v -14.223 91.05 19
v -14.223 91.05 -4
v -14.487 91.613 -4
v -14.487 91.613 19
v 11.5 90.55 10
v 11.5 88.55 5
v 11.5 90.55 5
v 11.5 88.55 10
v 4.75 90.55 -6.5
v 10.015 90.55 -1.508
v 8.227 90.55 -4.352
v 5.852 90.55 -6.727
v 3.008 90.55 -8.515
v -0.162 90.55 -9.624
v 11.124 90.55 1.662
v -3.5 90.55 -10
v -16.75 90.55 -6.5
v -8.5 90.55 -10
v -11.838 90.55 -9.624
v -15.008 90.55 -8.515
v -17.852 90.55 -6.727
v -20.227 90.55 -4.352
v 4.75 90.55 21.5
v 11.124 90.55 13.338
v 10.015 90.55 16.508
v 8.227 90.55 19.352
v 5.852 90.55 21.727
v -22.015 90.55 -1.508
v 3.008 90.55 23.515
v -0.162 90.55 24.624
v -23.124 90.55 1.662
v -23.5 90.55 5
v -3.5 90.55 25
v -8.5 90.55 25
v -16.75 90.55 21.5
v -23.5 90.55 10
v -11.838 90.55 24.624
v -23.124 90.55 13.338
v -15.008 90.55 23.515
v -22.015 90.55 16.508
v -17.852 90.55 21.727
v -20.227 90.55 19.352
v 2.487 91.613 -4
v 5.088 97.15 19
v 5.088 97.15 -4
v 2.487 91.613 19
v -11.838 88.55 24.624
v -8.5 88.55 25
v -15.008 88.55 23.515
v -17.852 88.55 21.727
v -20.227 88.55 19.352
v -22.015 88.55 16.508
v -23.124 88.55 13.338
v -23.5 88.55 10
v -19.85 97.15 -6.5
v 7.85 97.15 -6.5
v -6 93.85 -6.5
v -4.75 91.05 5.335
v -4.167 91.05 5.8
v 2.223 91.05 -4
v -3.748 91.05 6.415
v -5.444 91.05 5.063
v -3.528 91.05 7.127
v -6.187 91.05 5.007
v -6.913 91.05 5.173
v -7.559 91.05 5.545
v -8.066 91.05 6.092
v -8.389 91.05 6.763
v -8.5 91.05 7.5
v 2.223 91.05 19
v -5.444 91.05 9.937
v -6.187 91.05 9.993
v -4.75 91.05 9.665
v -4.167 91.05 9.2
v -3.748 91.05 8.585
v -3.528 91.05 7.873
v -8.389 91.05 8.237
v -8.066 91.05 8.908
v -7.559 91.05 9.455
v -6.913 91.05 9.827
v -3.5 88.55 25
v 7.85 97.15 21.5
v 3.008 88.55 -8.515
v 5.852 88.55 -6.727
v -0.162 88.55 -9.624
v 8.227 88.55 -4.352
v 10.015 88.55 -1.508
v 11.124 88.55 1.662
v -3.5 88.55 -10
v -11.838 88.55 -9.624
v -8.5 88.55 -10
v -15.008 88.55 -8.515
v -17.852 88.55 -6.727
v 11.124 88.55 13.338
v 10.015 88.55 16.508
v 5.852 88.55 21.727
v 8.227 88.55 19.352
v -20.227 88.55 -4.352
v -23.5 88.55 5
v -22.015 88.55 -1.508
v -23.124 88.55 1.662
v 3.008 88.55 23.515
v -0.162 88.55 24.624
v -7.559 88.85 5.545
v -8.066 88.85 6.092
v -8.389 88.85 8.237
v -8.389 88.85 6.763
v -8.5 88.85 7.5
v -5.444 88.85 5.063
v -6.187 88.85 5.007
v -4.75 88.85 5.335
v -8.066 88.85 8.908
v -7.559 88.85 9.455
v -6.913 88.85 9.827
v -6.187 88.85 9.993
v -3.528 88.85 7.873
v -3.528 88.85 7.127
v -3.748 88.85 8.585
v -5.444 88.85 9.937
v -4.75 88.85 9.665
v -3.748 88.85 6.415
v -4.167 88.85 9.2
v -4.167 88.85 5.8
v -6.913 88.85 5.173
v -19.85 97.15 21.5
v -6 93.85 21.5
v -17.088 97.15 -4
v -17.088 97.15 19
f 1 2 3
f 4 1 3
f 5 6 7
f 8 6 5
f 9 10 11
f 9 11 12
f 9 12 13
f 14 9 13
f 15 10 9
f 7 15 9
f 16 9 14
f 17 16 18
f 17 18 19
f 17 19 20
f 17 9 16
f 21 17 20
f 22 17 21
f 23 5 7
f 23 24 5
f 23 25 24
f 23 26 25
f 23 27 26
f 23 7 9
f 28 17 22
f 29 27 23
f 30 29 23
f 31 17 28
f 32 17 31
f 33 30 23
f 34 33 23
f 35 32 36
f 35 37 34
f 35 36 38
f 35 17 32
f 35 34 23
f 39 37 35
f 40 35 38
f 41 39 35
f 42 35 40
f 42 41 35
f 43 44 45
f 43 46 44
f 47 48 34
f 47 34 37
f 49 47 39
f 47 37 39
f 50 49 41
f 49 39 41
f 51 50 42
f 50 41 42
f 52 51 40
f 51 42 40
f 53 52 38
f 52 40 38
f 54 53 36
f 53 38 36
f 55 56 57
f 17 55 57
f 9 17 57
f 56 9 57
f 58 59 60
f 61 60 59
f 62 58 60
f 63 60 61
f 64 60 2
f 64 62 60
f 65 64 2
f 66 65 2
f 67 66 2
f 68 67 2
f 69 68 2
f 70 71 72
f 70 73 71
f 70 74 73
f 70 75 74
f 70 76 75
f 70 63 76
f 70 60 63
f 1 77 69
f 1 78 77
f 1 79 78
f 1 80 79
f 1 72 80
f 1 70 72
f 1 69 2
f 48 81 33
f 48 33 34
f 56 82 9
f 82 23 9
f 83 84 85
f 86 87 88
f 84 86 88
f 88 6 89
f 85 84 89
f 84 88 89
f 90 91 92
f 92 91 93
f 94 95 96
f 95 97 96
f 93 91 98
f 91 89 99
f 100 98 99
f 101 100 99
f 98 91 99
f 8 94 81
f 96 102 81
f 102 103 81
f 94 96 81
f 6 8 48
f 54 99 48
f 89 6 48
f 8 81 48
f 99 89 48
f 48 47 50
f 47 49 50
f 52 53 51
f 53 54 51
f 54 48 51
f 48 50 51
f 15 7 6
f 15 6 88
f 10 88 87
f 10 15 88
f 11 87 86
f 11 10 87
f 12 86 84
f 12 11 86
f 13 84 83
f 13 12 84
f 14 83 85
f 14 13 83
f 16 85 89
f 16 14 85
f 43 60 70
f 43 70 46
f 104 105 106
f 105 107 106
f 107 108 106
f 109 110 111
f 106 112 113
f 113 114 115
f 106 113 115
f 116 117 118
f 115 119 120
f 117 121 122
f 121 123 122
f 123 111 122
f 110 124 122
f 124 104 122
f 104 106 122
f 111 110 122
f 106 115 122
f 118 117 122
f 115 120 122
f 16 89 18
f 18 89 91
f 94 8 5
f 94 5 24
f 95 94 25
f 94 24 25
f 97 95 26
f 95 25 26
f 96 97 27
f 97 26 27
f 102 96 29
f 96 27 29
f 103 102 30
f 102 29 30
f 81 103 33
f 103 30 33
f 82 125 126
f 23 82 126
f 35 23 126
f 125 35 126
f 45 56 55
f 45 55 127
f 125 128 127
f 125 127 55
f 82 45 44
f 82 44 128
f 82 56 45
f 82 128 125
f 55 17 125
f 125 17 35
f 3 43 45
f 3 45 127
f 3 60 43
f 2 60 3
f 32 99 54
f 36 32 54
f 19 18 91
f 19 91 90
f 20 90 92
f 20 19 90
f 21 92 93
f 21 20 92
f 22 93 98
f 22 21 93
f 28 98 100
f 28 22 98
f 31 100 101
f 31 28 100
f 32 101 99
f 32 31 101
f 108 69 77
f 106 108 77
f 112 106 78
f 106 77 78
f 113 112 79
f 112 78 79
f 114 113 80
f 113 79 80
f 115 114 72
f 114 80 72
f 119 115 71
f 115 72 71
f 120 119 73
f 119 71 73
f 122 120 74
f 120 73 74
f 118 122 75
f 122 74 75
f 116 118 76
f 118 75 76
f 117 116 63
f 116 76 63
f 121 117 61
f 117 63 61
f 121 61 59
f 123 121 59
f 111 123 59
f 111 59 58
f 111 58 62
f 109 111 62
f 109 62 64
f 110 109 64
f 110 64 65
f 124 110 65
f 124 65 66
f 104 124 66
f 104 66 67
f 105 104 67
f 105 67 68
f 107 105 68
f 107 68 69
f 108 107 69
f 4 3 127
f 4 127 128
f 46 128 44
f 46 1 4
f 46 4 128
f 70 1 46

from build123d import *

# Parameters (mm, degrees)
F1_DEPTH     = 6
F3_DEPTH     = 15
F5_DEPTH     = 5.0000008951
F6_R         = 5
F10_DEPTH    = 5
F11_W        = 35
F11_H        = 35
F12_DEPTH    = 2
F15_W        = 27.7
F15_H        = 28
F13_W        = 21.5
F13_H        = 28
F17_T        = 2.5
F17_T3_DEPTH = 26.5
F17_T5_DEPTH = 33
F19_R        = 2.5
F20_DEPTH    = 54.5
F21_R        = 15
F22_R        = 3
F23_R        = 0.5
F24_R        = 2
F25_R        = 6
F28_DEPTH    = 0.3


# Not quite as in the source:
# - ends of sketch curves that miss each other by under 0.0002 mm in the source are joined
# - a shell that OpenCascade refuses in one call is made with other operations: the cavity is built on its own and cut out


with BuildPart() as f1:
    # F0 (on Top) → F1 (new body)
    with BuildSketch(Plane.XY):
        Polygon((11.0000005256, -18.05), (11.0000005256, -20.55), (-11.0000005256, -20.55), (-10.9999994744, 20.55), (11.0000005256, 20.55), (11.0000005256, 18.05), (15.8927322497, 21.8000001848), (16.1137396651, 25.5500003695), (11.4420153564, 25.5500003695), (-15.9999997161, 25.5500003695), (-16.000001023, -25.5500003695), (11.4420153564, -25.5500003695), (16.1137396651, -25.5500003695), (15.8927322497, -21.8000001848), align=None)
    extrude(amount=F1_DEPTH)

    # F2 (on face) → F3 (join)
    with BuildSketch(Plane(origin=(0, 0, 0), x_dir=(1, 0, 0), z_dir=(0, 0, -1))):
        Polygon((-10.9999994744, -25.5500003695), (-15.9999997161, -25.5500003695), (-15.9999997161, -40.5500003695), (-10.9999994744, -40.5500003695), (4.0000002839, -40.5500003695), (4.0000002839, -36.5500003695), (-10.9999994744, -36.5500003695), align=None)
    extrude(amount=-F3_DEPTH)

    # F4 (on face) → F5 (cut, through all)
    with BuildSketch(Plane.YZ.offset(-10.9999994744)):
        Polygon((25.5500003695, 15), (25.5500003695, 6), (29.5500003695, 6), (36.5500003695, 15), align=None)
    extrude(amount=-F5_DEPTH, mode=Mode.SUBTRACT)

    # F6
    f6_edges = [f1.edges().sort_by_distance(p)[0] for p in [
        (4, 38.55, 15),
    ]]
    fillet(f6_edges, radius=F6_R)


with BuildPart() as f10:
    # F9 (on offset) → F10 (new body)
    with BuildSketch(Plane(origin=(0, 65.5500003695, 0), x_dir=(-1, 0, 0), z_dir=(0, 1, 0))):
        with BuildLine():
            Line((15.9999997161, 0), (15.9999997161, 15))
            Line((15.9999997161, 15), (0.9999997161, 15))
            ThreePointArc((0.9999997161, 15), (-2.5355341898, 13.5355339059), (-4.0000002839, 10))
            Line((-4.0000002839, 10), (-4.0000002839, 0))
            Line((-4.0000002839, 0), (15.9999997161, 0))
        make_face()
    extrude(amount=F10_DEPTH)


with BuildPart() as f12:
    # F11 (on offset) → F12 (new body)
    with BuildSketch(Plane(origin=(0, 88.5500003695, 0), x_dir=(-1, 0, 0), z_dir=(0, 1, 0))):
        with Locations((5.9999997161, 7.5)):
            Rectangle(F11_W, F11_H)
    extrude(amount=F12_DEPTH)

    # F15 (on offset) → F16 section 0
    with BuildSketch(Plane(origin=(0, 97.1500003695, 0), x_dir=(-1, 0, 0), z_dir=(0, 1, 0))):
        with Locations((5.9999997161, 7.5)):
            Rectangle(F15_W, F15_H)
    # F13 (on face) → F16 section 1
    with BuildSketch(Plane(origin=(0, 90.5500003695, 0), x_dir=(-1, 0, 0), z_dir=(0, 1, 0))):
        with Locations((5.9999997161, 7.5)):
            Rectangle(F13_W, F13_H)
    loft()

    # F17: shell of thickness 2.5, made by hand


with BuildPart() as f17_core1:
    # F17_t2: copy of F12
    add(f12.part)

    # the walls: a layer under each face that stays
    f17_faces = [f17_core1.faces().sort_by_distance(p)[0] for p in [
        (-5.9999997161, 89.5500003695, -10),
        (11.5000002839, 89.5500003695, 7.5),
        (-23.4999997161, 89.5500003695, 7.5),
        (-5.9999997161, 88.5500003695, 7.5),
        (5.6666669506, 90.5500003695, -4.1666666667),
        (-5.9999997161, 89.5500003695, 25),
        (-5.9999997161, 93.8500003695, -6.5),
        (-18.2999997161, 93.8500003695, 7.5),
        (-5.9999997161, 93.8500003695, 21.5),
        (6.3000002839, 93.8500003695, 7.5),
    ]]
    thicken(f17_faces, amount=-F17_T, mode=Mode.SUBTRACT)

    # F17_s4 → F17_t3 (cut)
    with BuildSketch(Plane.YZ.offset(-19.2499997161)):
        Polygon((90.5750003695, -6.525), (88.0500003695, -6.5), (88.0500003695, -4), (90.5500003695, -4), align=None)
        Polygon((90.5750003695, 21.525), (88.0500003695, 21.5), (88.0500003695, 19), (90.5500003695, 19), align=None)
    extrude(amount=F17_T3_DEPTH, mode=Mode.SUBTRACT)

    # F17_s6 → F17_t5 (cut)
    with BuildSketch(Plane.XY.offset(-9)):
        Polygon((-16.7726279476, 90.5643719578), (-16.7499997161, 88.0500003695), (-12.8137208564, 88.0500003695), (-14.4871765615, 91.6128415482), align=None)
        Polygon((4.7726285154, 90.5643719578), (4.7500002839, 88.0500003695), (0.8137214242, 88.0500003695), (2.4871771293, 91.6128415482), align=None)
    extrude(amount=F17_T5_DEPTH, mode=Mode.SUBTRACT)


with BuildPart() as f12_1:
    add(f12.part)

    # what is left inside the walls is the cavity
    f17_cavity = [f17_core1.part.solids().sort_by_distance(p)[0] for p in [
        (-2.215544, 97.125, 11.243908),
    ]]
    add(f17_cavity, mode=Mode.SUBTRACT)


with BuildPart() as f20_tool:
    # F19 (on face) → F20 (new body, through all)
    with BuildSketch(Plane(origin=(0, 91.0500003695, 0), x_dir=(-1, 0, 0), z_dir=(0, 1, 0))):
        with Locations((5.9999997161, 7.5)):
            Circle(F19_R)
    extrude(amount=-F20_DEPTH)


with BuildPart() as f1_1:
    add(f1.part)

    # F20: cut by f20_tool
    add(f20_tool.part, mode=Mode.SUBTRACT)

    # F22
    f22_edges = [f1_1.edges().sort_by_distance(p)[0] for p in [
        (-16.000001, -25.55, 3),
        (-10.999999, 25.55, 3),
    ]]
    fillet(f22_edges, radius=F22_R)

    # F23
    f23_edges = [f1_1.edges().sort_by_distance(p)[0] for p in [
        (11.000001, -18.05, 3),
        (11.000001, 18.05, 3),
        (-10.999999, 20.55, 3),
        (-11.000001, -20.55, 3),
    ]]
    fillet(f23_edges, radius=F23_R)

    # F24
    f24_edges = [f1_1.edges().sort_by_distance(p)[0] for p in [
        (-16, 40.55, 7.5),
        (-10.999999, 36.55, 7.5),
    ]]
    fillet(f24_edges, radius=F24_R)

    # F25
    f25_edges = [f1_1.edges().sort_by_distance(p)[0] for p in [
        (-13.5, 29.55, 6),
    ]]
    fillet(f25_edges, radius=F25_R)


with BuildPart() as f12_2:
    add(f12_1.part)

    # F20: cut by f20_tool
    add(f20_tool.part, mode=Mode.SUBTRACT)

    # F21
    f21_edges = [f12_2.edges().sort_by_distance(p)[0] for p in [
        (11.5, 89.55, 25),
        (-23.5, 89.55, 25),
        (-23.5, 89.55, -10),
        (11.5, 89.55, -10),
    ]]
    fillet(f21_edges, radius=F21_R)

    # F27 (on face) → F28 (join)
    with BuildSketch(Plane.XZ.offset(-88.5500003695)):
        with BuildLine():
            ThreePointArc((11.5000002839, 10), (7.1066020017, 20.6066017178), (-3.4999997161, 25))
            Line((-3.4999997161, 25), (-8.4999997161, 25))
            ThreePointArc((-8.4999997161, 25), (-19.1066014339, 20.6066017178), (-23.4999997161, 10))
            Line((-23.4999997161, 10), (-23.4999997161, 5))
            ThreePointArc((-23.4999997161, 5), (-19.1066014339, -5.6066017178), (-8.4999997161, -10))
            Line((-8.4999997161, -10), (-3.4999997161, -10))
            ThreePointArc((-3.4999997161, -10), (7.1066020017, -5.6066017178), (11.5000002839, 5))
            Line((11.5000002839, 5), (11.5000002839, 10))
        make_face()
    extrude(amount=-F28_DEPTH)


solid = f12_2.part
